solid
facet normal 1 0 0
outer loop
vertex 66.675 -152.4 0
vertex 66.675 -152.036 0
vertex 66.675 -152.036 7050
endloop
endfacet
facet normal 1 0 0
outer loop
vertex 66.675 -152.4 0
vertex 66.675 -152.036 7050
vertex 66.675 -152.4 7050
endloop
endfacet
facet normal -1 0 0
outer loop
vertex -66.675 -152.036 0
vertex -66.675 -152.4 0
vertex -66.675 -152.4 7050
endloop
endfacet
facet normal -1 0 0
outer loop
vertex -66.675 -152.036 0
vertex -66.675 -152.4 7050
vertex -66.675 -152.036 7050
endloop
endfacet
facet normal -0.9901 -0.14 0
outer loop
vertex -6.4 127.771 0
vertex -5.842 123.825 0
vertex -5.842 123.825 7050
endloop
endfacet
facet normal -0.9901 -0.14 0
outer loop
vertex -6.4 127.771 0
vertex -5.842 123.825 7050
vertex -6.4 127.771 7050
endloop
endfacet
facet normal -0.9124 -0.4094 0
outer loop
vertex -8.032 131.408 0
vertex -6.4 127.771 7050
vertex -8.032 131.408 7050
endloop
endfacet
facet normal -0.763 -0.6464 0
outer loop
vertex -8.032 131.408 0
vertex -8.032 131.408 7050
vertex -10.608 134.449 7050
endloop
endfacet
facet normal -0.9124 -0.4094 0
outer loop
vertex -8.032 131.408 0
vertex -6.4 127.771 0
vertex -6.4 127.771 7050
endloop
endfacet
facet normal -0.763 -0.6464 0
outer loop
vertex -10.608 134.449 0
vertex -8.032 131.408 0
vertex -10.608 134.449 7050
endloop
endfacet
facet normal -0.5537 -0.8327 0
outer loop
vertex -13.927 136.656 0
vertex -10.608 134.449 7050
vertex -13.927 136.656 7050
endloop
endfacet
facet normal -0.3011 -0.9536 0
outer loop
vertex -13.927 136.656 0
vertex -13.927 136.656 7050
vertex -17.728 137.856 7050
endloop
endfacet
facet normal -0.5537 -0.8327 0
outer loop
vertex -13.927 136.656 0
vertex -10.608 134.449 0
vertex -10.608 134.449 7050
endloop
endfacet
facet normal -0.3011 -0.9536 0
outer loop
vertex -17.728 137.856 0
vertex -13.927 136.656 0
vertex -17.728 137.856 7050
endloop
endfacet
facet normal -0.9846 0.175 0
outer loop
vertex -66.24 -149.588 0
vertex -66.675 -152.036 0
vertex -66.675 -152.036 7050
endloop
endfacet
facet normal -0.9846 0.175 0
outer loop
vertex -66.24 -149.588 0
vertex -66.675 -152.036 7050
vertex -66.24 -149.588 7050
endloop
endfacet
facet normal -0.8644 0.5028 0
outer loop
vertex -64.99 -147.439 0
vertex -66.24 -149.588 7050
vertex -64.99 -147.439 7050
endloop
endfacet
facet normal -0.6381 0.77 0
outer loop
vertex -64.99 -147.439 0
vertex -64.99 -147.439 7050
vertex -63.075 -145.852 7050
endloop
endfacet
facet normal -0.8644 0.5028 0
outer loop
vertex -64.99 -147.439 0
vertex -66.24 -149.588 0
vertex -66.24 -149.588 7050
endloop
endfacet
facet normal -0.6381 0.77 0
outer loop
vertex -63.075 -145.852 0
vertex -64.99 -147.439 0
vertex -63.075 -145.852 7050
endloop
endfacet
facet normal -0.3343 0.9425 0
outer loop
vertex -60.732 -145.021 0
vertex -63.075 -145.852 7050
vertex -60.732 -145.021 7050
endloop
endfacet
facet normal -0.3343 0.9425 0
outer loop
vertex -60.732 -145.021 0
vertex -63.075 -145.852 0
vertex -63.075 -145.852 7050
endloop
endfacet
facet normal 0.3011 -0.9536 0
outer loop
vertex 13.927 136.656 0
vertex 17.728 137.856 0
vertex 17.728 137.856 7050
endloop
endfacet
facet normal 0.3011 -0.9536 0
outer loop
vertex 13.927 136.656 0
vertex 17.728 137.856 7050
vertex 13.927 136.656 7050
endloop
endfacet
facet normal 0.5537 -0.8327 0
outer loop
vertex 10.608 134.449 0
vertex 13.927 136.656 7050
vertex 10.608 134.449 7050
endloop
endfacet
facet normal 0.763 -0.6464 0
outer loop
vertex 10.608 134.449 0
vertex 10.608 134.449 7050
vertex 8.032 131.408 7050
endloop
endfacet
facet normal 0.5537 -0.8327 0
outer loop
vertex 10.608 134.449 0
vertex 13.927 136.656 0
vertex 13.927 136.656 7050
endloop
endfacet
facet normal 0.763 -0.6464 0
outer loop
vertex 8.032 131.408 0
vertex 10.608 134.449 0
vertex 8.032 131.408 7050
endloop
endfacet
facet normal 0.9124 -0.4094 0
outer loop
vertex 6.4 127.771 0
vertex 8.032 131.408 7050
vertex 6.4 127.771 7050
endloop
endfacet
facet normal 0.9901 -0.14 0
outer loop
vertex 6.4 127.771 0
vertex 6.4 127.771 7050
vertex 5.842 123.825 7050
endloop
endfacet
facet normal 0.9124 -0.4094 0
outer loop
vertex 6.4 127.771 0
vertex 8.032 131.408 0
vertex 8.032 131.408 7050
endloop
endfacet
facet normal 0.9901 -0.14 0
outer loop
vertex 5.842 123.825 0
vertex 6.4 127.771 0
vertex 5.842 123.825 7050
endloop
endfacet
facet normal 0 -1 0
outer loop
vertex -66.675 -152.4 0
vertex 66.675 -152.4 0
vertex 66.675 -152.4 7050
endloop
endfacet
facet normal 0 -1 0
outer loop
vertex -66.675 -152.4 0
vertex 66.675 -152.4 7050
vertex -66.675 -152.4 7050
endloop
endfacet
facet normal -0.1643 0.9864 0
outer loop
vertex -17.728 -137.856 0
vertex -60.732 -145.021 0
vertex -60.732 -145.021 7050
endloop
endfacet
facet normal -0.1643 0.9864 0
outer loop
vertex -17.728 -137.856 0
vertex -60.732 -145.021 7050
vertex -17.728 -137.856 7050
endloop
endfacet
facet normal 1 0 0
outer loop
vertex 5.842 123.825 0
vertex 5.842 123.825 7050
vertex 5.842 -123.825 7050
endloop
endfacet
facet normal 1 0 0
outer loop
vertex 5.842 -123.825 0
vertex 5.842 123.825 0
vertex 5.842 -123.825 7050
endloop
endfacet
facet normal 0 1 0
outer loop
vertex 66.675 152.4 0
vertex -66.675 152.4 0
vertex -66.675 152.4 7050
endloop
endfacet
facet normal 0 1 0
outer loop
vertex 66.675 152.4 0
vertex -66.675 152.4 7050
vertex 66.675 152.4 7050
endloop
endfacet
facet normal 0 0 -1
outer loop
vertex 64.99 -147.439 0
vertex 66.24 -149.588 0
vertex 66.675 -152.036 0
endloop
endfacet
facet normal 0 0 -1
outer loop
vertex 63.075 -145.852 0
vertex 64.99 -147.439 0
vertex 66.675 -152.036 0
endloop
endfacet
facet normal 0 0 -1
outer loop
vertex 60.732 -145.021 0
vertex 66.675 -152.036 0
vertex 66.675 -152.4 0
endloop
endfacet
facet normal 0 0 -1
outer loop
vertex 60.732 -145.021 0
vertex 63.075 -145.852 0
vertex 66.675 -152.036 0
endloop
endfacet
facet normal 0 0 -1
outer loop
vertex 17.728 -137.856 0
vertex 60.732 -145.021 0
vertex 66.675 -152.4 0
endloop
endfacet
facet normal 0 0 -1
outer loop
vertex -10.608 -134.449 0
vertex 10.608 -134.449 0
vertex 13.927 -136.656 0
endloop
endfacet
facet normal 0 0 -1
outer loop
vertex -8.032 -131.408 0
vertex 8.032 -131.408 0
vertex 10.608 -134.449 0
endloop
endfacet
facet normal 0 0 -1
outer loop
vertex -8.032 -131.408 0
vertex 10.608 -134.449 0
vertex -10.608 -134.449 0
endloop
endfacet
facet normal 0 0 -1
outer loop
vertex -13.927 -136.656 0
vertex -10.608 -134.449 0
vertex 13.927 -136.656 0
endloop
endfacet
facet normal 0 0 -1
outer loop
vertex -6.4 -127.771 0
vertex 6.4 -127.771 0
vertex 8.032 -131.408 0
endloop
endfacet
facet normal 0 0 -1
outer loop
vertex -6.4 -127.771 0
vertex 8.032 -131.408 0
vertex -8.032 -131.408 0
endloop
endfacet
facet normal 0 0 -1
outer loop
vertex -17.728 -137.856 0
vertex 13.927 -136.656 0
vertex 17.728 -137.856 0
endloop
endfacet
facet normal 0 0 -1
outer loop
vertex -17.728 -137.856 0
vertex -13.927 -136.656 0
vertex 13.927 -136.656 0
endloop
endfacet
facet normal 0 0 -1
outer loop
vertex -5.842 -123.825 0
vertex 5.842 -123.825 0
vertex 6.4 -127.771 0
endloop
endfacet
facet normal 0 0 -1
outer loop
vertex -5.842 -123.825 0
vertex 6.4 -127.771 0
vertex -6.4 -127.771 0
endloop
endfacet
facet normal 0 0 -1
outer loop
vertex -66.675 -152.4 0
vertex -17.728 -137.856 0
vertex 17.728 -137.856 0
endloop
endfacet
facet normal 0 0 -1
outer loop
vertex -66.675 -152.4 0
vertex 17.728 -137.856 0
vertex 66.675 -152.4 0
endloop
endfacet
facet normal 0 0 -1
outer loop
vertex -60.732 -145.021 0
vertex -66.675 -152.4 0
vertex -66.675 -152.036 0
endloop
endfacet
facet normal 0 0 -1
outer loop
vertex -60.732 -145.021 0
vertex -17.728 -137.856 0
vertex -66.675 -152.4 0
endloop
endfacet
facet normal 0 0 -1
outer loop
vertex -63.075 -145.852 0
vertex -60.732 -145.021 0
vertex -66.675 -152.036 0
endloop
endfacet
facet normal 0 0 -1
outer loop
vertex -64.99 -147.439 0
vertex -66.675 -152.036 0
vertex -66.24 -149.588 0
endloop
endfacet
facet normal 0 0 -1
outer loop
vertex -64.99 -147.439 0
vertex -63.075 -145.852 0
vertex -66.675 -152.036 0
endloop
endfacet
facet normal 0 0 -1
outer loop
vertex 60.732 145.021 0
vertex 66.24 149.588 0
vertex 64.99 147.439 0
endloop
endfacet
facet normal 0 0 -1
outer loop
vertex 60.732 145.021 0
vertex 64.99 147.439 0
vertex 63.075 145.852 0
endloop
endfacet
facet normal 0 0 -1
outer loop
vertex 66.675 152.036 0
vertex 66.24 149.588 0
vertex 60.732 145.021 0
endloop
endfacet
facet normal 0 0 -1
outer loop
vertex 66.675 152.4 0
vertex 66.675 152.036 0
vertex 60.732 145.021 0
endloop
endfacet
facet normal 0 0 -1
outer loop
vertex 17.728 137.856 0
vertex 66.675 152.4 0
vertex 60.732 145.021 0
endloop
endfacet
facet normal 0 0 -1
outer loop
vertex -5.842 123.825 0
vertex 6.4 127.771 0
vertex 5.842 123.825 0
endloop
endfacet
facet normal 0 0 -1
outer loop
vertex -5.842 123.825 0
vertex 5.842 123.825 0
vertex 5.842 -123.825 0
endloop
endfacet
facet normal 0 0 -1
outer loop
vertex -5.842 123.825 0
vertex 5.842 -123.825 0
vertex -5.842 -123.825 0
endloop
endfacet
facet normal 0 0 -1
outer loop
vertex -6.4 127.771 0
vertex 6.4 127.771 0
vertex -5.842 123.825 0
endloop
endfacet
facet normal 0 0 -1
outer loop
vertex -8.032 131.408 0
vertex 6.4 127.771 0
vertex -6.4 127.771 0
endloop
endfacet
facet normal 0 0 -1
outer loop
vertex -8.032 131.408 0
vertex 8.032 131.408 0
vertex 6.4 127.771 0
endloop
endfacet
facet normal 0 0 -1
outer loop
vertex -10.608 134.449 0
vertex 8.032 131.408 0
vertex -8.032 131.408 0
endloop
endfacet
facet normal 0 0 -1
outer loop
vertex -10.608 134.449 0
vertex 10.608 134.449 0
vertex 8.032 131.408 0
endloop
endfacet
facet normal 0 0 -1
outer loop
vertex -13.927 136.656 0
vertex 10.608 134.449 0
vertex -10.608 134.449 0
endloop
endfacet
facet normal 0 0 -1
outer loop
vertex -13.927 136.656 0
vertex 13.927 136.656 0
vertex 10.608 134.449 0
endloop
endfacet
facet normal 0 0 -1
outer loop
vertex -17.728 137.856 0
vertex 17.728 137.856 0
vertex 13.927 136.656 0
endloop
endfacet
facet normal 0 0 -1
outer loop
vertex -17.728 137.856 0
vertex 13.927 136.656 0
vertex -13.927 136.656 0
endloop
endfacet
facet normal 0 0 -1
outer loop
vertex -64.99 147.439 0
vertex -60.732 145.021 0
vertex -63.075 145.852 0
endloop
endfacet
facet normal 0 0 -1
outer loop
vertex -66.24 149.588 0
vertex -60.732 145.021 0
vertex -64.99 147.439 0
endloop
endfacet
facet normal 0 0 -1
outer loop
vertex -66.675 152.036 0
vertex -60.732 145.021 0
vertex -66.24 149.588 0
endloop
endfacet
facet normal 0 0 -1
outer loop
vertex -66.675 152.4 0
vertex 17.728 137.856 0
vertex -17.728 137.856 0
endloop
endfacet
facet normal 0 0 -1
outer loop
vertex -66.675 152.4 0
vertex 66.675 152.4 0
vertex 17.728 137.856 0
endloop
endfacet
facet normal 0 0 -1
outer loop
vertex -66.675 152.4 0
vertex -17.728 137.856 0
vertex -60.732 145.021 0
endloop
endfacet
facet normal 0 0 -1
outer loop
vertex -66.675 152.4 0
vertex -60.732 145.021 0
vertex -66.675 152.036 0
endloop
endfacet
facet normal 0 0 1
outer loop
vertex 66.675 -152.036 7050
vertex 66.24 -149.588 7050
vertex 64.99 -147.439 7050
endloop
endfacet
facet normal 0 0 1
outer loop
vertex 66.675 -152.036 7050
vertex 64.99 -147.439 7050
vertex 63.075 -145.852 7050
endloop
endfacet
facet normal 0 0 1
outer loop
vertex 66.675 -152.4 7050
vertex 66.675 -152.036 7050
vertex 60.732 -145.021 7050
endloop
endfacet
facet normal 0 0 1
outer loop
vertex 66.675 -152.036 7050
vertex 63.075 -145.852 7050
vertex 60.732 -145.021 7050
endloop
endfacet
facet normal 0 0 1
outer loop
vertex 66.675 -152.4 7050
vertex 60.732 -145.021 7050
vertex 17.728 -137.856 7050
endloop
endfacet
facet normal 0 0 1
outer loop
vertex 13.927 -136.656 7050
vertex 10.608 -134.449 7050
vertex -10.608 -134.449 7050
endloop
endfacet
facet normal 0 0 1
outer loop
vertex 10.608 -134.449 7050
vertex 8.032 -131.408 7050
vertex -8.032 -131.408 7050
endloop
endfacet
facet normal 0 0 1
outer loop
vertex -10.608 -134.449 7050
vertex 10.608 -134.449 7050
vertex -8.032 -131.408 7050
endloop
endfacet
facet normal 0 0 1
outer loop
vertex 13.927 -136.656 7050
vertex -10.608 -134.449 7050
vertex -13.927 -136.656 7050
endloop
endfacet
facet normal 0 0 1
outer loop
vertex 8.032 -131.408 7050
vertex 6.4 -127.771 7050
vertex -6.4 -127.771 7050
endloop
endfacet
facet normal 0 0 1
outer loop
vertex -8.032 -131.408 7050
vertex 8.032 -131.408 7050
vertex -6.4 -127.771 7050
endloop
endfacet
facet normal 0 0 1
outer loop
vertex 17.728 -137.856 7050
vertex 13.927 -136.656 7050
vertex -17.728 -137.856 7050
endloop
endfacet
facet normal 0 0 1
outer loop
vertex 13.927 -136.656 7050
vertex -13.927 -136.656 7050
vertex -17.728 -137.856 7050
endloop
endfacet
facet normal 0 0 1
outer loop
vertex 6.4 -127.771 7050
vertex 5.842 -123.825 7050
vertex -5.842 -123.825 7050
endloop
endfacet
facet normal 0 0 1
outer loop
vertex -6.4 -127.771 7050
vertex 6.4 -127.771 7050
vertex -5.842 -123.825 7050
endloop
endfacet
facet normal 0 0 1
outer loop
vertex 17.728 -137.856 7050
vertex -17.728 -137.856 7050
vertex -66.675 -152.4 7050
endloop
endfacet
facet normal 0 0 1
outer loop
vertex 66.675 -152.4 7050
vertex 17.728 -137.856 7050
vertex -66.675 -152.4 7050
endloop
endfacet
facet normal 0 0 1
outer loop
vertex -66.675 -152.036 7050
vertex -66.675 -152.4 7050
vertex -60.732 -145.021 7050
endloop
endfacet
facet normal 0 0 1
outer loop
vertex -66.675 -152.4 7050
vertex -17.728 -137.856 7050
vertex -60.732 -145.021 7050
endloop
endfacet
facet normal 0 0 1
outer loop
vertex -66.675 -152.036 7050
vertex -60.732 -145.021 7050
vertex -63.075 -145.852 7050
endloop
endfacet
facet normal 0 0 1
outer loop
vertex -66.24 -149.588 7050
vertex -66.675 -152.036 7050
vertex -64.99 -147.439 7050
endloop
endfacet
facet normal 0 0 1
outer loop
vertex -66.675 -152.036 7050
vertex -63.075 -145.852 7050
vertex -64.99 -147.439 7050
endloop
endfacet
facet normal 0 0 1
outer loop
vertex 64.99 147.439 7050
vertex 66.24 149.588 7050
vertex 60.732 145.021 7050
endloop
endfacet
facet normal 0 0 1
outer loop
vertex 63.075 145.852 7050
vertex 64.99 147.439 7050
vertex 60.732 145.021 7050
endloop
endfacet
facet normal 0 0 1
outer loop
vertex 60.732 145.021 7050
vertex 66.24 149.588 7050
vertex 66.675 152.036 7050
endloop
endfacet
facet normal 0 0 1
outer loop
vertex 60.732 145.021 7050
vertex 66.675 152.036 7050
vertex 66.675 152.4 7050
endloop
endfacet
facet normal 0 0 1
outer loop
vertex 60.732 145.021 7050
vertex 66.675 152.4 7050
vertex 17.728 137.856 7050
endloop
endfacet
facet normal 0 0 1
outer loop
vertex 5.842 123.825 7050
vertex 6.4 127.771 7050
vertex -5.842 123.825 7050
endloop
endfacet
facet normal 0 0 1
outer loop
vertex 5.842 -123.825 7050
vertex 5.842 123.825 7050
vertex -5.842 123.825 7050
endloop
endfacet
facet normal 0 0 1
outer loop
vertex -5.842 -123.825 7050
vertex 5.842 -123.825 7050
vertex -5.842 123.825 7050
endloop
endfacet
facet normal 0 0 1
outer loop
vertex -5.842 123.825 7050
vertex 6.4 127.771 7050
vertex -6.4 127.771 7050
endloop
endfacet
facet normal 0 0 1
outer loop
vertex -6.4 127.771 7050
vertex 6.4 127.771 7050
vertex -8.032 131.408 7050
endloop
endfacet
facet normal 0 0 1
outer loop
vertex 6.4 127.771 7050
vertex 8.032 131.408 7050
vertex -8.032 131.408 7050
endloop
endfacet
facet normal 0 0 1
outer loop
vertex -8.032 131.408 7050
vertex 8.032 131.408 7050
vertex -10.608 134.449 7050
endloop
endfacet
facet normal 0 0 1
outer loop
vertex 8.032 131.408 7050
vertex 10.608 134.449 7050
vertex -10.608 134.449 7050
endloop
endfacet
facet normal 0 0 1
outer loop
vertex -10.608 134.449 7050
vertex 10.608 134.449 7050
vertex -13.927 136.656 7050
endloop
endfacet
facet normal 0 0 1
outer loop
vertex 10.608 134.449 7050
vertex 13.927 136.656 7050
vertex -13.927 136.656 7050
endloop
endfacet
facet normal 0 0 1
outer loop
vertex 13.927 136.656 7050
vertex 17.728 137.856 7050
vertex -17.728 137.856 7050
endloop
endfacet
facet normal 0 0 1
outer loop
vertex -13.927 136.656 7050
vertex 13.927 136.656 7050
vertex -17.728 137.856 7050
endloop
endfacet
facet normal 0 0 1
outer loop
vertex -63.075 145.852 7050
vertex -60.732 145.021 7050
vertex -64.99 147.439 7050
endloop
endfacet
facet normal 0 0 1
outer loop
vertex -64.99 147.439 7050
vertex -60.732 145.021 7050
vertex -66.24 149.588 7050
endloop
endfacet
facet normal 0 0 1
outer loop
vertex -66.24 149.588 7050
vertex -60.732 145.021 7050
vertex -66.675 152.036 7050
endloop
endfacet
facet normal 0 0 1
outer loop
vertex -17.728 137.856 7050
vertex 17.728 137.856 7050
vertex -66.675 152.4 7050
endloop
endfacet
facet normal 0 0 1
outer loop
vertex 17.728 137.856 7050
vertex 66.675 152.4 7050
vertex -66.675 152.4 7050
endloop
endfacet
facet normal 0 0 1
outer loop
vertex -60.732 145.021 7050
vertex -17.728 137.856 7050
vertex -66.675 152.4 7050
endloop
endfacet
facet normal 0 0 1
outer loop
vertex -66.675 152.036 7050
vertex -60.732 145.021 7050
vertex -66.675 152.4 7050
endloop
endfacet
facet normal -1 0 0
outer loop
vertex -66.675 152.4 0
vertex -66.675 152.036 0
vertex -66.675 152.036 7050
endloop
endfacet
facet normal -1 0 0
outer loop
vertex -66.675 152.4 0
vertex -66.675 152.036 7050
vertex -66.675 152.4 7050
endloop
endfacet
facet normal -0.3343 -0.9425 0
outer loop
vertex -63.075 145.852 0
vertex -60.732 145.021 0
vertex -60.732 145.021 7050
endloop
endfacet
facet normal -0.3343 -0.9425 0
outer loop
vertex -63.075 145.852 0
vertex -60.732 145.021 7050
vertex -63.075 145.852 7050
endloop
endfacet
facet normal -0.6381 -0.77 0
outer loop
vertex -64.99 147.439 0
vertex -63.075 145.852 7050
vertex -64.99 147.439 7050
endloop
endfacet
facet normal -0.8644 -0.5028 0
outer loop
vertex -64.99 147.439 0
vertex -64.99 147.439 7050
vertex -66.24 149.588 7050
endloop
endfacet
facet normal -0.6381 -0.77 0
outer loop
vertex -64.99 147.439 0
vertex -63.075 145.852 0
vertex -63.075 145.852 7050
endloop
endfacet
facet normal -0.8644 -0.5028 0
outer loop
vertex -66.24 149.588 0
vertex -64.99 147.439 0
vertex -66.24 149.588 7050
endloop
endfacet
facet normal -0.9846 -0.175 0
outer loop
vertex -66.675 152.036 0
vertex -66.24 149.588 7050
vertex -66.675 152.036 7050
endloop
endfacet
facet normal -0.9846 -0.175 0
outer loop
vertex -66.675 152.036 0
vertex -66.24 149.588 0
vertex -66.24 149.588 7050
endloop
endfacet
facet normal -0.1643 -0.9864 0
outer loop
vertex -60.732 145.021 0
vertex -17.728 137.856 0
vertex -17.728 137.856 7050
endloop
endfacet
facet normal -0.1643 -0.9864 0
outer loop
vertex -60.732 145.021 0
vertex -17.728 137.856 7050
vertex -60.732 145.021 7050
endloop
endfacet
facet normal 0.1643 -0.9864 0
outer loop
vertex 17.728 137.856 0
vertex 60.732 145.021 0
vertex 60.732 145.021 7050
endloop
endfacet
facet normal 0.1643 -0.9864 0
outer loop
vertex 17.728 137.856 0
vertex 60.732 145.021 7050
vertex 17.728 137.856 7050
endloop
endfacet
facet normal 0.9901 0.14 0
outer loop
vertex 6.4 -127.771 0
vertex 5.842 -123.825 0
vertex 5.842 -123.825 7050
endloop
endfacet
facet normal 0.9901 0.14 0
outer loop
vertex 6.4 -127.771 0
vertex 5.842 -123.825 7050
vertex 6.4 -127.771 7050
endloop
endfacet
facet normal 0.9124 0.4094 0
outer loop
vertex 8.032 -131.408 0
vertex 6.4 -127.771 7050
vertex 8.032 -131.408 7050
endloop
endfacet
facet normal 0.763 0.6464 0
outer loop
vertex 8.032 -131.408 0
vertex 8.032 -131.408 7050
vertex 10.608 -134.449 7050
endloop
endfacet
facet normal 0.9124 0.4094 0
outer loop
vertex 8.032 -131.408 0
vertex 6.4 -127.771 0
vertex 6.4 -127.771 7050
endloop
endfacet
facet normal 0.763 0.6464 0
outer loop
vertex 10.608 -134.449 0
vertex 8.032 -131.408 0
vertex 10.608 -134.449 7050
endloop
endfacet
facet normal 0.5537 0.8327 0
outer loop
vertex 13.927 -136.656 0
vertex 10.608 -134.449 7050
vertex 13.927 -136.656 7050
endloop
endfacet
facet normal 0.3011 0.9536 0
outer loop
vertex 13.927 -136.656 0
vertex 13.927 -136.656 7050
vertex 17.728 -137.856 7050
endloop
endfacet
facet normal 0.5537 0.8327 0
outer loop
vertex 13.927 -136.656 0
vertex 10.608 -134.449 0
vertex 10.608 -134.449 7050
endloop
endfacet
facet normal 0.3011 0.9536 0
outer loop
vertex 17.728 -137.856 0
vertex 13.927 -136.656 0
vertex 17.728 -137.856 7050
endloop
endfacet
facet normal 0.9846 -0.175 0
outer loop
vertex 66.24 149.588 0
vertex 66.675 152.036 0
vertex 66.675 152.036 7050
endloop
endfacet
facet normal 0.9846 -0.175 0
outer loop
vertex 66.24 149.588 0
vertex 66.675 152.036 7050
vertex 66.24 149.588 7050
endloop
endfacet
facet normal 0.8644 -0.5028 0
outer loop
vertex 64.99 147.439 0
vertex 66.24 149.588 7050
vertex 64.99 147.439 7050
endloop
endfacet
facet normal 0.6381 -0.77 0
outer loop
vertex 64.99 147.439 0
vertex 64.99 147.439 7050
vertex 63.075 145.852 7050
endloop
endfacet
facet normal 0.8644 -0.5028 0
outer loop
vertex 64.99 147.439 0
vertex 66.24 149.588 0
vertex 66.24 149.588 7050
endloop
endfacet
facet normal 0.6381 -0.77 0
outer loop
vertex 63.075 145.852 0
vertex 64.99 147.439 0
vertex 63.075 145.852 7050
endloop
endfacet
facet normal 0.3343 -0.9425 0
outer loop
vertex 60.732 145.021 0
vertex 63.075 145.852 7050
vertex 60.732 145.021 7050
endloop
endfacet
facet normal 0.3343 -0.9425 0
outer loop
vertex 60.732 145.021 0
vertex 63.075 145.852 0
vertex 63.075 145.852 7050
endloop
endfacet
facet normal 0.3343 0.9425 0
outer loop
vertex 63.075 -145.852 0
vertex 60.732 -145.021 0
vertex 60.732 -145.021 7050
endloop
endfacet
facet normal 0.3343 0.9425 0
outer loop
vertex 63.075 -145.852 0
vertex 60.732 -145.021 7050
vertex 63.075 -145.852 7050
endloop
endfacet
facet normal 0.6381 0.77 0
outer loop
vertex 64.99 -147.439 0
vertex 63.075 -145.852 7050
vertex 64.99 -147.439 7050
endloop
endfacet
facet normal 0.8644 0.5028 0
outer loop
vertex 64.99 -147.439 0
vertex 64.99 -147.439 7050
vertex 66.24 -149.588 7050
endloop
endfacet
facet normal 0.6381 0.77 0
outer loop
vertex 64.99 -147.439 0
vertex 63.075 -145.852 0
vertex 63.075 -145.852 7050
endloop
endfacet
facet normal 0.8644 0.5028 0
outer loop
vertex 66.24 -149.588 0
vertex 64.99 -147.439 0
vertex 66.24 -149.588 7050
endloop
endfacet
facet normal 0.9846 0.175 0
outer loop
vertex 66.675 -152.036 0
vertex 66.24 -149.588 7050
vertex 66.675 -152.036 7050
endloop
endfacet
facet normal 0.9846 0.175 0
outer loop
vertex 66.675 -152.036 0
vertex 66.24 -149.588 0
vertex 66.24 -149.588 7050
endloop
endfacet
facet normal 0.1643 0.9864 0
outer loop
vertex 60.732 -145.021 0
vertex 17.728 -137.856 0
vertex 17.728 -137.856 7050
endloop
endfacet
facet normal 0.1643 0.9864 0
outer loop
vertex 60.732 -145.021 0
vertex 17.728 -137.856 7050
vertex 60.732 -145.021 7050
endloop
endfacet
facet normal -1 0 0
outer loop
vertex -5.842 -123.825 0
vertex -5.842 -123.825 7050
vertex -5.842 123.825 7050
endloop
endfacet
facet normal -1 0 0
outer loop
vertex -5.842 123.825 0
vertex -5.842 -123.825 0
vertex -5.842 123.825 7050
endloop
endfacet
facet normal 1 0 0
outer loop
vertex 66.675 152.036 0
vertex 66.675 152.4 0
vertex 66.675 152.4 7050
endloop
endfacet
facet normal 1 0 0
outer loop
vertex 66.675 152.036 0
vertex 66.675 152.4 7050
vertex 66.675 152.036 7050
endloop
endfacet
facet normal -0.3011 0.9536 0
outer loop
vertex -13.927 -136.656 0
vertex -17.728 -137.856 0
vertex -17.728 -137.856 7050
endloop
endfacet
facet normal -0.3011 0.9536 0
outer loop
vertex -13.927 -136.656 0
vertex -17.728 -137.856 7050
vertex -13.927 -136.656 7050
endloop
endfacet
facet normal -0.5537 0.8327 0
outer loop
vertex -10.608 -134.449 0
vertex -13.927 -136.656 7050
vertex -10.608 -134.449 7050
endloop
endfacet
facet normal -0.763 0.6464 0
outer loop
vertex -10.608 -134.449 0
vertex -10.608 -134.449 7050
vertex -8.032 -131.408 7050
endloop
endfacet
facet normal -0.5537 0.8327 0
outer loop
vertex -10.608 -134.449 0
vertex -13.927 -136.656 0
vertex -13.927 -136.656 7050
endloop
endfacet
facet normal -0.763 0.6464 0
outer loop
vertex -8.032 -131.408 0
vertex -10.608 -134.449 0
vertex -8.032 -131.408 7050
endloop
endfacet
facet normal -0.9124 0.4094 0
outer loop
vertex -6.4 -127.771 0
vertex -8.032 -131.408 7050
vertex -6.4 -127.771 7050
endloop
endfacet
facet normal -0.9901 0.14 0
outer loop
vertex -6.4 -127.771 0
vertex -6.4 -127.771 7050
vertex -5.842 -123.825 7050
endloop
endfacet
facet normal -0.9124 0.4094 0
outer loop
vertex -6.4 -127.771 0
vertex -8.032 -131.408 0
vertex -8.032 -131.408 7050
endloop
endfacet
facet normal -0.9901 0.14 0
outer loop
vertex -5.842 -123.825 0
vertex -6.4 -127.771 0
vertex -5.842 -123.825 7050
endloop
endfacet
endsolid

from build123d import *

# Parameters (mm, degrees)
EXTRUDE1_DEPTH = 7050


with BuildPart() as part:
    # Sketch1 → Extrude1 (new body)
    with BuildSketch(Plane.XY):
        with BuildLine():
            Line((-66.675, -152.4), (-66.675, -152.03634552))
            ThreePointArc((-66.675, -152.03634552), (-64.989504955, -147.439217289), (-60.731921268, -145.021064551))
            Line((-60.731921268, -145.021064551), (-17.728157464, -137.855561937))
            ThreePointArc((-17.728157464, -137.855561937), (-9.212990089, -133.019256462), (-5.842, -123.825))
            Line((-5.842, -123.825), (-5.842, 123.825))
            ThreePointArc((-5.842, 123.825), (-9.212990089, 133.019256462), (-17.728157464, 137.855561937))
            Line((-17.728157464, 137.855561937), (-60.731921268, 145.021064551))
            ThreePointArc((-60.731921268, 145.021064551), (-64.989504955, 147.439217289), (-66.675, 152.03634552))
            Line((-66.675, 152.03634552), (-66.675, 152.4))
            Line((-66.675, 152.4), (66.675, 152.4))
            Line((66.675, 152.4), (66.675, 152.03634552))
            ThreePointArc((66.675, 152.03634552), (64.989504955, 147.439217289), (60.731921268, 145.021064551))
            Line((60.731921268, 145.021064551), (17.728157464, 137.855561937))
            ThreePointArc((17.728157464, 137.855561937), (9.212990089, 133.019256462), (5.842, 123.825))
            Line((5.842, 123.825), (5.842, -123.825))
            ThreePointArc((5.842, -123.825), (9.212990089, -133.019256462), (17.728157464, -137.855561937))
            Line((17.728157464, -137.855561937), (60.731921268, -145.021064551))
            ThreePointArc((60.731921268, -145.021064551), (64.989504955, -147.439217289), (66.675, -152.03634552))
            Line((66.675, -152.03634552), (66.675, -152.4))
            Line((66.675, -152.4), (-66.675, -152.4))
        make_face()
    extrude(amount=EXTRUDE1_DEPTH)


solid = part.part
